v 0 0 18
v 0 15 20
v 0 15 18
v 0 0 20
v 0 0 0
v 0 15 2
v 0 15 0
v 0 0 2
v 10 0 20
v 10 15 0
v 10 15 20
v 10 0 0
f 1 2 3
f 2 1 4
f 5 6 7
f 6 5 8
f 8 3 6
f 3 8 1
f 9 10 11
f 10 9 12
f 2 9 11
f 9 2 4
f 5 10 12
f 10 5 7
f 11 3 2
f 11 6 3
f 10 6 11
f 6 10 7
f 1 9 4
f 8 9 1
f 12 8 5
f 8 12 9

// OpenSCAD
// Show/hide
SHOW_BOTTOM = 0;
SHOW_COVER = 0;

// Box dimensions
BOTTOM_HEIGHT = 13;
BOTTOM_WIDTH = 30;
COVER_HEIGHT = 4;

// Connecting clip dimensions
CLIP_WIDTH = 3;
CLIP_THICK = 1.5;
CLIP_OFFSET = 3;

// Usb plug dimensions
USB_WIDTH  = 16;
USB_HEIGHT = 7.5;
USB_DEPTH  = 17.5;
USB_CABLE_R = 3;
USB_CABLE_L = 18;
USB_JOIN_W = 0;
USB_JOIN_H = 0;
USB_JOIN_L = 0;

// Display port dimensions
DP_WIDTH  = 11;
DP_HEIGHT = 7.4;
DP_DEPTH  = 20;
DP_CABLE_R = 2.5;
DP_CABLE_L = 15;
DP_JOIN_W = 7.8;
DP_JOIN_H = 7.4;
DP_JOIN_L = 6;

// Power connector dimensions
PW_WIDTH = 18;
PW_HEIGHT = 7.5;
PW_DEPTH = 9.5;
PW_CABLE_R = 3.5;
PW_CABLE_L = 25;
PW_JOIN_W = 13;
PW_JOIN_H = 5.5;

// Spacing
BASELINE_OFFSET = USB_HEIGHT/2;
LEFT_WALL = 5;
USB_TO_DP_OFFSET = 19;
USB_TO_PWR_OFFSET = 48;
RIGHT_WALL = 5;

// Screws
SCREW_HOLE = 2.4;
NUT_HOLE = 5;
BOLD_HOLE = 4;

// Rubber strip
STRIP_WIDTH = 4;
STRIP_HEIGHT = 0.5;
STRIP_OFFSET = 3;
STRIP = [STRIP_WIDTH, STRIP_HEIGHT, STRIP_OFFSET];

// Derived dimensions
USB_POSITION = LEFT_WALL;
DP_POSITION = USB_POSITION + USB_TO_DP_OFFSET;
PWR_POSITION = USB_POSITION + USB_TO_PWR_OFFSET;
BOX_LENGTH = PWR_POSITION + PW_WIDTH + RIGHT_WALL;

module connector_space(first, second, third, offset, strip) {
    translate([first[0]/2, first[2]/2, -offset])
    union() {
        // conn
        cube([first[0], first[2], first[1]], center = true);
        translate([0, 0, offset/2])
            cube([first[0], first[2], offset], center = true);
        // cable
        translate([0, (first[2]+third[1])/2, 0])
            rotate([90,0,0])
                cylinder(third[1], third[0], third[0], center = true, $fn = 100);
        translate([0, (first[2]+third[1])/2, offset/2])
            cube([third[0]*2, third[1], offset], center = true);
        // join
        translate([0, (first[2]+second[2])/2, 0])
            cube([second[0], second[2], second[1]], center = true);
        translate([0, (first[2]+second[2])/2, offset/2])
            cube([second[0], second[2], offset], center = true);
        // rubber gap
        translate([0, (strip[0]-first[2])/2+strip[2], first[1]/2])
            cube([first[0], strip[0], strip[1]*2], center = true);
        translate([0, (strip[0]-first[2])/2+strip[2], -first[1]/2])
            cube([first[0], strip[0], strip[1]*2], center = true);
    }
}

module power_space(first, second, third, offset, strip) {
    translate([first[0]/2, first[2]/2, -offset])
    union() {
        // connctor
        cube([first[0], first[2], first[1]], center = true);
        translate([0, 0, offset/2])
            cube([first[0], first[2], offset], center = true);
        // wire
        translate([(third[1]-first[0])/2, first[2]/2 + third[0], 0])
            rotate([0,90,0])
                cylinder(third[1], third[0], third[0], center = true, $fn = 100);
        translate([(third[1]-first[0])/2, first[2]/2 + third[0], offset/2])
            cube([third[1], third[0]*2, offset], center = true);
        // join
        translate([0, first[2]/2, 0])
            cube([second[0], third[0] + first[2]/2, second[1]], center = true);
        // rubber gap
        translate([0, (strip[0]-first[2])/2+strip[2], first[1]/2])
            cube([first[0], strip[0], strip[1]*2], center = true);
        translate([0, (strip[0]-first[2])/2+strip[2], -first[1]/2])
            cube([first[0], strip[0], strip[1]*2], center = true);
        // led slot
        translate([0, first[2]/2 + third[0], offset+10/2])
            cube([second[0], 2, 10], center = true);
    }
}

module clip(length, design_width, design_thick) {
    width = design_width * 0.9;
    thick = design_thick * 0.9;
    translate([thick/2, 0, -length/2])
        union() {
            cube([thick, width, length], center = true);
            diagonal = sqrt(2)/2*thick;
            translate([thick/2, 0, (thick-length)/2])
                difference() {
                    rotate([0, 45, 0])
                        cube([diagonal, width, diagonal], center = true);
                    translate([0, -width/2, 0])
                        cube([diagonal, width, diagonal]);
                }
        }
}

module clip_slot(length, width, thick) {
    space = thick/2 * 1.1;
    translate([thick/2, 0, -length/2])
        union() {
            cube([thick, width, length], center = true);
            translate([thick/2, 0, -length/2 + space/2])
                cube([thick, width, space], center = true);
        }
}

module nut_side(dia, nut_dia, length) {
    nut_thick = nut_dia*0.42;
    translate([0, 0, -nut_thick])
        union() {
            cylinder(nut_thick, nut_dia / 2, nut_dia / 2, $fn = 6);
            translate([0, 0, -length])
                cylinder(length, dia / 2, dia / 2, $fn = 100);
        }
}

module bolt_side(dia, nut_dia, length) {
    nut_thick = nut_dia*0.3;
    translate([0, 0, -nut_thick])
        union() {
            cylinder(nut_thick, nut_dia / 2, nut_dia / 2, $fn = 100);
            translate([0, 0, -length])
                cylinder(length, dia / 2, dia / 2, $fn = 100);
        }
}

module inner_space() {
    union() {
        translate([USB_POSITION, 0, 0])
            connector_space(
                [USB_WIDTH, USB_HEIGHT, USB_DEPTH],
                [USB_JOIN_W, USB_JOIN_H, USB_JOIN_L],
                [USB_CABLE_R, USB_CABLE_L],
                BASELINE_OFFSET,
                STRIP
            );
        translate([DP_POSITION, 0, 0])
            connector_space(
                [DP_WIDTH, DP_HEIGHT, DP_DEPTH],
                [DP_JOIN_W, DP_JOIN_H, DP_JOIN_L],
                [DP_CABLE_R, DP_CABLE_L],
                BASELINE_OFFSET,
                STRIP
            );
        translate([PWR_POSITION, 0, 0])
            power_space(
                [PW_WIDTH, PW_HEIGHT, PW_DEPTH],
                [PW_JOIN_W, PW_JOIN_H],
                [PW_CABLE_R, PW_CABLE_L],
                BASELINE_OFFSET,
                STRIP
            );
    }
}

module tower() {
    cube();
}

module wall() {

}

if (SHOW_BOTTOM) {
    color([0.1, 0.4, 0.1])
    difference() {
        translate([0,0,-BOTTOM_HEIGHT])
            cube([BOX_LENGTH, BOTTOM_WIDTH, BOTTOM_HEIGHT]);
        inner_space();
        translate([3, 3, -BOTTOM_HEIGHT]) rotate([180, 0, 0])
            nut_side(SCREW_HOLE, NUT_HOLE, BOTTOM_HEIGHT);    
        translate([BOX_LENGTH-3, 3, -BOTTOM_HEIGHT]) rotate([180, 0, 0])
            nut_side(SCREW_HOLE, NUT_HOLE, BOTTOM_HEIGHT);    
        translate([BOX_LENGTH/2, BOTTOM_WIDTH-3, -BOTTOM_HEIGHT]) rotate([180, 0, 0])
            nut_side(SCREW_HOLE, NUT_HOLE, BOTTOM_HEIGHT);    
        translate([BOX_LENGTH/2, 3, -BOTTOM_HEIGHT]) rotate([180, 0, 0])
            nut_side(SCREW_HOLE, NUT_HOLE, BOTTOM_HEIGHT);
        // plastic clips to connect parts, don't work, they break off
        // translate([0, BOTTOM_WIDTH/2, 0])
        //  clip_slot(BOTTOM_HEIGHT, CLIP_WIDTH, CLIP_THICK);
        // translate([BOX_LENGTH, CLIP_OFFSET, 0]) rotate([0, 0, 180])
        //  clip_slot(BOTTOM_HEIGHT, CLIP_WIDTH, CLIP_THICK);
        // translate([BOX_LENGTH, BOTTOM_WIDTH-CLIP_OFFSET, 0]) rotate([0, 0, 180])
        //  clip_slot(BOTTOM_HEIGHT, CLIP_WIDTH, CLIP_THICK);
    }
}

// COVER
if (SHOW_COVER) {
    color([0.2, 0.5, 0.2])
    difference() {
        cube([BOX_LENGTH, BOTTOM_WIDTH, COVER_HEIGHT]);
        translate([3, 3, COVER_HEIGHT+0.01])
            bolt_side(SCREW_HOLE, BOLD_HOLE, BOTTOM_HEIGHT);    
        translate([BOX_LENGTH-3, 3, COVER_HEIGHT+0.01])
            bolt_side(SCREW_HOLE, BOLD_HOLE, BOTTOM_HEIGHT);    
        translate([BOX_LENGTH/2, BOTTOM_WIDTH-3, COVER_HEIGHT+0.01])
            bolt_side(SCREW_HOLE, BOLD_HOLE, BOTTOM_HEIGHT);    
        translate([BOX_LENGTH/2, 3, COVER_HEIGHT+0.01])
            bolt_side(SCREW_HOLE, BOLD_HOLE, BOTTOM_HEIGHT);    
        inner_space();
        // plastic clips to connect parts, don't work, they break off
        // Union:
        // translate([0, BOTTOM_WIDTH/2, 0])
        //  clip(BOTTOM_HEIGHT, CLIP_WIDTH, CLIP_THICK);
        // translate([BOX_LENGTH, CLIP_OFFSET, 0]) rotate([0, 0, 180])
        //  clip(BOTTOM_HEIGHT, CLIP_WIDTH, CLIP_THICK);
        // translate([BOX_LENGTH, BOTTOM_WIDTH-CLIP_OFFSET, 0]) rotate([0, 0, 180])
        //  clip(BOTTOM_HEIGHT, CLIP_WIDTH, CLIP_THICK);
    }
}

positions = [
    [0, 0,  1,  1, 180],
    [0, 1,  1, -1,  90],
    [1, 1, -1, -1,   0],
    [1, 0, -1,  1, -90]
];

module smooth_cube(size, radius, center = false, radius = 0, roundx = [], roundy = [], roundz = []) {
    difference() {
    cube(size, center);
        if (radius > 0) {
            // x
            for(index = roundx) {
                pos = positions[index];
                difference() {
                    translate([0, size[1] * pos[0] + radius * pos[2], size[2] * pos[1] + radius * pos[3]])
                        rotate([pos[4], 0, 0])
                            cube([size[0], radius, radius]);
                    translate([0, size[1] * pos[0] + radius * pos[2], size[2] * pos[1] + radius * pos[3]])
                        rotate([0, 90, 0])
                            cylinder(size[0], radius, radius, $fn=100);
                }
            }
            // y
            for(index = roundy) {
                pos = positions[index];
                difference() {
                    translate([-size[0] * pos[0] - radius * pos[2], 0, size[2] * pos[1] + radius * pos[3]])
                        rotate([0, pos[4]-90, 0])
                            cube([radius, size[1], radius]);
                    translate([-size[0] * pos[0] - radius * pos[2], 0, size[2] * pos[1] + radius * pos[3]])
                        rotate([-90, 0, 0])
                            cylinder(size[1], radius, radius, $fn=100);
                }
            }
            // z
            for(index = roundz) {
                pos = positions[index];
                difference() {
                    translate([size[0] * pos[0] + radius * pos[2], size[1] * pos[1] + radius * pos[3], 0])
                        rotate([0, 0, pos[4]])
                            cube([radius, radius, size[2]]);
                    translate([size[0] * pos[0] + radius * pos[2], size[1] * pos[1] + radius * pos[3], 0])
                        rotate([0, 0, 90])
                            cylinder(size[2], radius, radius, $fn=100);
                }
            }            
        }
    }
}

smooth_cube([10, 15, 20], radius=2, 
    /*roundx=[0, 1, 2, 3],*/ roundy=[0, 1, 2, 3]/*, roundz=[0, 1, 2, 3]*/);
